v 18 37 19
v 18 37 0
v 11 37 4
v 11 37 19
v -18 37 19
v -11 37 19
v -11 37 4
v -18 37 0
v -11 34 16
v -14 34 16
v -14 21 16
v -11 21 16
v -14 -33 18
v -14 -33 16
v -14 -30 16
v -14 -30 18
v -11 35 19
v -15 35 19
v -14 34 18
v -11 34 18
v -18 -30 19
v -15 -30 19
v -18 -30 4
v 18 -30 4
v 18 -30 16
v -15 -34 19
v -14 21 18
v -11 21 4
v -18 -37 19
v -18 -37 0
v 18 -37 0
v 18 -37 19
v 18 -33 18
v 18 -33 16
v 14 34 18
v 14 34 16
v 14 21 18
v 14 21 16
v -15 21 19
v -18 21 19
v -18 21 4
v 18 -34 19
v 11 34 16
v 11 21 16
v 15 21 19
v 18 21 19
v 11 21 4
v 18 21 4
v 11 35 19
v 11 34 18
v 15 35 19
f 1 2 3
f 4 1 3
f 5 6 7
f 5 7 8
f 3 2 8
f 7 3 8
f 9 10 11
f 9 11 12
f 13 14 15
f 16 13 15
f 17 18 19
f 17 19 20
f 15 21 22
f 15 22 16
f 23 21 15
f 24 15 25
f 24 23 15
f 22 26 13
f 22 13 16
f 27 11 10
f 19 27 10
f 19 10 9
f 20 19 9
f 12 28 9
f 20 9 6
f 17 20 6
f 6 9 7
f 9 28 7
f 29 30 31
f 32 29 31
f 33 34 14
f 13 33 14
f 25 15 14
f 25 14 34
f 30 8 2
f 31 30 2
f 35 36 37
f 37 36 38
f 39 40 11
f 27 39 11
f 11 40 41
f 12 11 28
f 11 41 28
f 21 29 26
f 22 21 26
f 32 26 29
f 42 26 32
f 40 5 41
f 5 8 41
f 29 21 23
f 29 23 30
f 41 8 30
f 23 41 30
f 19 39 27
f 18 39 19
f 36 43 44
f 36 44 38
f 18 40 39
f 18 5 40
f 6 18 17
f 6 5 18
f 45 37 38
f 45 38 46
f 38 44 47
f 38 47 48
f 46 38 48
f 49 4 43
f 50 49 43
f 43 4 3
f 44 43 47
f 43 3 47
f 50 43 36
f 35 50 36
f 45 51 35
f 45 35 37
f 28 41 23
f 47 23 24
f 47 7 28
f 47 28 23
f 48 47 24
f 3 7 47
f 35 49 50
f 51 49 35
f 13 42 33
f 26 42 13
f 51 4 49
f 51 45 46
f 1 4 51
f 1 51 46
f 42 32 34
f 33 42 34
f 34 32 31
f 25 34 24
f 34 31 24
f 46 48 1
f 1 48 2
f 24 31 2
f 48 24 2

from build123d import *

# Parameters (mm, degrees)
F0_W     = 36
F0_H     = 74
F1_DEPTH = 4
F2_W     = 3
F2_H     = 13
F2_W_2   = 32
F2_H_2   = 3
F3_DEPTH = 12
F4_DEPTH = 15
F5_SIZE  = 1


with BuildPart() as f1:
    # F0 (on Top) → F1 (new body)
    with BuildSketch(Plane.XY):
        Rectangle(F0_W, F0_H)
    extrude(amount=F1_DEPTH)

    # F2 (on face) → F3 (join)
    with BuildSketch(Plane.XY.offset(4)):
        with Locations((-12.5, 27.5)):
            Rectangle(F2_W, F2_H)
        with Locations((12.5, 27.5)):
            Rectangle(F2_W, F2_H)
        with Locations((2, -31.5)):
            Rectangle(F2_W_2, F2_H_2)
    extrude(amount=F3_DEPTH)

    # F2 (on face) → F4 (join)
    with BuildSketch(Plane.XY.offset(4)):
        Polygon((-11, 37), (-18, 37), (-18, 21), (-14, 21), (-14, 34), (-11, 34), align=None)
        Polygon((18, 37), (11, 37), (11, 34), (14, 34), (14, 21), (18, 21), align=None)
        Polygon((-14, -30), (-18, -30), (-18, -37), (18, -37), (18, -33), (-14, -33), align=None)
    extrude(amount=F4_DEPTH)

    # F5
    f5_edges = [f1.edges().sort_by_distance(p)[0] for p in [
        (-14, 27.5, 19),
        (-12.5, 34, 19),
        (12.5, 34, 19),
        (14, 27.5, 19),
        (2, -33, 19),
        (-14, -31.5, 19),
    ]]
    chamfer(f5_edges, length=F5_SIZE)


solid = f1.part
